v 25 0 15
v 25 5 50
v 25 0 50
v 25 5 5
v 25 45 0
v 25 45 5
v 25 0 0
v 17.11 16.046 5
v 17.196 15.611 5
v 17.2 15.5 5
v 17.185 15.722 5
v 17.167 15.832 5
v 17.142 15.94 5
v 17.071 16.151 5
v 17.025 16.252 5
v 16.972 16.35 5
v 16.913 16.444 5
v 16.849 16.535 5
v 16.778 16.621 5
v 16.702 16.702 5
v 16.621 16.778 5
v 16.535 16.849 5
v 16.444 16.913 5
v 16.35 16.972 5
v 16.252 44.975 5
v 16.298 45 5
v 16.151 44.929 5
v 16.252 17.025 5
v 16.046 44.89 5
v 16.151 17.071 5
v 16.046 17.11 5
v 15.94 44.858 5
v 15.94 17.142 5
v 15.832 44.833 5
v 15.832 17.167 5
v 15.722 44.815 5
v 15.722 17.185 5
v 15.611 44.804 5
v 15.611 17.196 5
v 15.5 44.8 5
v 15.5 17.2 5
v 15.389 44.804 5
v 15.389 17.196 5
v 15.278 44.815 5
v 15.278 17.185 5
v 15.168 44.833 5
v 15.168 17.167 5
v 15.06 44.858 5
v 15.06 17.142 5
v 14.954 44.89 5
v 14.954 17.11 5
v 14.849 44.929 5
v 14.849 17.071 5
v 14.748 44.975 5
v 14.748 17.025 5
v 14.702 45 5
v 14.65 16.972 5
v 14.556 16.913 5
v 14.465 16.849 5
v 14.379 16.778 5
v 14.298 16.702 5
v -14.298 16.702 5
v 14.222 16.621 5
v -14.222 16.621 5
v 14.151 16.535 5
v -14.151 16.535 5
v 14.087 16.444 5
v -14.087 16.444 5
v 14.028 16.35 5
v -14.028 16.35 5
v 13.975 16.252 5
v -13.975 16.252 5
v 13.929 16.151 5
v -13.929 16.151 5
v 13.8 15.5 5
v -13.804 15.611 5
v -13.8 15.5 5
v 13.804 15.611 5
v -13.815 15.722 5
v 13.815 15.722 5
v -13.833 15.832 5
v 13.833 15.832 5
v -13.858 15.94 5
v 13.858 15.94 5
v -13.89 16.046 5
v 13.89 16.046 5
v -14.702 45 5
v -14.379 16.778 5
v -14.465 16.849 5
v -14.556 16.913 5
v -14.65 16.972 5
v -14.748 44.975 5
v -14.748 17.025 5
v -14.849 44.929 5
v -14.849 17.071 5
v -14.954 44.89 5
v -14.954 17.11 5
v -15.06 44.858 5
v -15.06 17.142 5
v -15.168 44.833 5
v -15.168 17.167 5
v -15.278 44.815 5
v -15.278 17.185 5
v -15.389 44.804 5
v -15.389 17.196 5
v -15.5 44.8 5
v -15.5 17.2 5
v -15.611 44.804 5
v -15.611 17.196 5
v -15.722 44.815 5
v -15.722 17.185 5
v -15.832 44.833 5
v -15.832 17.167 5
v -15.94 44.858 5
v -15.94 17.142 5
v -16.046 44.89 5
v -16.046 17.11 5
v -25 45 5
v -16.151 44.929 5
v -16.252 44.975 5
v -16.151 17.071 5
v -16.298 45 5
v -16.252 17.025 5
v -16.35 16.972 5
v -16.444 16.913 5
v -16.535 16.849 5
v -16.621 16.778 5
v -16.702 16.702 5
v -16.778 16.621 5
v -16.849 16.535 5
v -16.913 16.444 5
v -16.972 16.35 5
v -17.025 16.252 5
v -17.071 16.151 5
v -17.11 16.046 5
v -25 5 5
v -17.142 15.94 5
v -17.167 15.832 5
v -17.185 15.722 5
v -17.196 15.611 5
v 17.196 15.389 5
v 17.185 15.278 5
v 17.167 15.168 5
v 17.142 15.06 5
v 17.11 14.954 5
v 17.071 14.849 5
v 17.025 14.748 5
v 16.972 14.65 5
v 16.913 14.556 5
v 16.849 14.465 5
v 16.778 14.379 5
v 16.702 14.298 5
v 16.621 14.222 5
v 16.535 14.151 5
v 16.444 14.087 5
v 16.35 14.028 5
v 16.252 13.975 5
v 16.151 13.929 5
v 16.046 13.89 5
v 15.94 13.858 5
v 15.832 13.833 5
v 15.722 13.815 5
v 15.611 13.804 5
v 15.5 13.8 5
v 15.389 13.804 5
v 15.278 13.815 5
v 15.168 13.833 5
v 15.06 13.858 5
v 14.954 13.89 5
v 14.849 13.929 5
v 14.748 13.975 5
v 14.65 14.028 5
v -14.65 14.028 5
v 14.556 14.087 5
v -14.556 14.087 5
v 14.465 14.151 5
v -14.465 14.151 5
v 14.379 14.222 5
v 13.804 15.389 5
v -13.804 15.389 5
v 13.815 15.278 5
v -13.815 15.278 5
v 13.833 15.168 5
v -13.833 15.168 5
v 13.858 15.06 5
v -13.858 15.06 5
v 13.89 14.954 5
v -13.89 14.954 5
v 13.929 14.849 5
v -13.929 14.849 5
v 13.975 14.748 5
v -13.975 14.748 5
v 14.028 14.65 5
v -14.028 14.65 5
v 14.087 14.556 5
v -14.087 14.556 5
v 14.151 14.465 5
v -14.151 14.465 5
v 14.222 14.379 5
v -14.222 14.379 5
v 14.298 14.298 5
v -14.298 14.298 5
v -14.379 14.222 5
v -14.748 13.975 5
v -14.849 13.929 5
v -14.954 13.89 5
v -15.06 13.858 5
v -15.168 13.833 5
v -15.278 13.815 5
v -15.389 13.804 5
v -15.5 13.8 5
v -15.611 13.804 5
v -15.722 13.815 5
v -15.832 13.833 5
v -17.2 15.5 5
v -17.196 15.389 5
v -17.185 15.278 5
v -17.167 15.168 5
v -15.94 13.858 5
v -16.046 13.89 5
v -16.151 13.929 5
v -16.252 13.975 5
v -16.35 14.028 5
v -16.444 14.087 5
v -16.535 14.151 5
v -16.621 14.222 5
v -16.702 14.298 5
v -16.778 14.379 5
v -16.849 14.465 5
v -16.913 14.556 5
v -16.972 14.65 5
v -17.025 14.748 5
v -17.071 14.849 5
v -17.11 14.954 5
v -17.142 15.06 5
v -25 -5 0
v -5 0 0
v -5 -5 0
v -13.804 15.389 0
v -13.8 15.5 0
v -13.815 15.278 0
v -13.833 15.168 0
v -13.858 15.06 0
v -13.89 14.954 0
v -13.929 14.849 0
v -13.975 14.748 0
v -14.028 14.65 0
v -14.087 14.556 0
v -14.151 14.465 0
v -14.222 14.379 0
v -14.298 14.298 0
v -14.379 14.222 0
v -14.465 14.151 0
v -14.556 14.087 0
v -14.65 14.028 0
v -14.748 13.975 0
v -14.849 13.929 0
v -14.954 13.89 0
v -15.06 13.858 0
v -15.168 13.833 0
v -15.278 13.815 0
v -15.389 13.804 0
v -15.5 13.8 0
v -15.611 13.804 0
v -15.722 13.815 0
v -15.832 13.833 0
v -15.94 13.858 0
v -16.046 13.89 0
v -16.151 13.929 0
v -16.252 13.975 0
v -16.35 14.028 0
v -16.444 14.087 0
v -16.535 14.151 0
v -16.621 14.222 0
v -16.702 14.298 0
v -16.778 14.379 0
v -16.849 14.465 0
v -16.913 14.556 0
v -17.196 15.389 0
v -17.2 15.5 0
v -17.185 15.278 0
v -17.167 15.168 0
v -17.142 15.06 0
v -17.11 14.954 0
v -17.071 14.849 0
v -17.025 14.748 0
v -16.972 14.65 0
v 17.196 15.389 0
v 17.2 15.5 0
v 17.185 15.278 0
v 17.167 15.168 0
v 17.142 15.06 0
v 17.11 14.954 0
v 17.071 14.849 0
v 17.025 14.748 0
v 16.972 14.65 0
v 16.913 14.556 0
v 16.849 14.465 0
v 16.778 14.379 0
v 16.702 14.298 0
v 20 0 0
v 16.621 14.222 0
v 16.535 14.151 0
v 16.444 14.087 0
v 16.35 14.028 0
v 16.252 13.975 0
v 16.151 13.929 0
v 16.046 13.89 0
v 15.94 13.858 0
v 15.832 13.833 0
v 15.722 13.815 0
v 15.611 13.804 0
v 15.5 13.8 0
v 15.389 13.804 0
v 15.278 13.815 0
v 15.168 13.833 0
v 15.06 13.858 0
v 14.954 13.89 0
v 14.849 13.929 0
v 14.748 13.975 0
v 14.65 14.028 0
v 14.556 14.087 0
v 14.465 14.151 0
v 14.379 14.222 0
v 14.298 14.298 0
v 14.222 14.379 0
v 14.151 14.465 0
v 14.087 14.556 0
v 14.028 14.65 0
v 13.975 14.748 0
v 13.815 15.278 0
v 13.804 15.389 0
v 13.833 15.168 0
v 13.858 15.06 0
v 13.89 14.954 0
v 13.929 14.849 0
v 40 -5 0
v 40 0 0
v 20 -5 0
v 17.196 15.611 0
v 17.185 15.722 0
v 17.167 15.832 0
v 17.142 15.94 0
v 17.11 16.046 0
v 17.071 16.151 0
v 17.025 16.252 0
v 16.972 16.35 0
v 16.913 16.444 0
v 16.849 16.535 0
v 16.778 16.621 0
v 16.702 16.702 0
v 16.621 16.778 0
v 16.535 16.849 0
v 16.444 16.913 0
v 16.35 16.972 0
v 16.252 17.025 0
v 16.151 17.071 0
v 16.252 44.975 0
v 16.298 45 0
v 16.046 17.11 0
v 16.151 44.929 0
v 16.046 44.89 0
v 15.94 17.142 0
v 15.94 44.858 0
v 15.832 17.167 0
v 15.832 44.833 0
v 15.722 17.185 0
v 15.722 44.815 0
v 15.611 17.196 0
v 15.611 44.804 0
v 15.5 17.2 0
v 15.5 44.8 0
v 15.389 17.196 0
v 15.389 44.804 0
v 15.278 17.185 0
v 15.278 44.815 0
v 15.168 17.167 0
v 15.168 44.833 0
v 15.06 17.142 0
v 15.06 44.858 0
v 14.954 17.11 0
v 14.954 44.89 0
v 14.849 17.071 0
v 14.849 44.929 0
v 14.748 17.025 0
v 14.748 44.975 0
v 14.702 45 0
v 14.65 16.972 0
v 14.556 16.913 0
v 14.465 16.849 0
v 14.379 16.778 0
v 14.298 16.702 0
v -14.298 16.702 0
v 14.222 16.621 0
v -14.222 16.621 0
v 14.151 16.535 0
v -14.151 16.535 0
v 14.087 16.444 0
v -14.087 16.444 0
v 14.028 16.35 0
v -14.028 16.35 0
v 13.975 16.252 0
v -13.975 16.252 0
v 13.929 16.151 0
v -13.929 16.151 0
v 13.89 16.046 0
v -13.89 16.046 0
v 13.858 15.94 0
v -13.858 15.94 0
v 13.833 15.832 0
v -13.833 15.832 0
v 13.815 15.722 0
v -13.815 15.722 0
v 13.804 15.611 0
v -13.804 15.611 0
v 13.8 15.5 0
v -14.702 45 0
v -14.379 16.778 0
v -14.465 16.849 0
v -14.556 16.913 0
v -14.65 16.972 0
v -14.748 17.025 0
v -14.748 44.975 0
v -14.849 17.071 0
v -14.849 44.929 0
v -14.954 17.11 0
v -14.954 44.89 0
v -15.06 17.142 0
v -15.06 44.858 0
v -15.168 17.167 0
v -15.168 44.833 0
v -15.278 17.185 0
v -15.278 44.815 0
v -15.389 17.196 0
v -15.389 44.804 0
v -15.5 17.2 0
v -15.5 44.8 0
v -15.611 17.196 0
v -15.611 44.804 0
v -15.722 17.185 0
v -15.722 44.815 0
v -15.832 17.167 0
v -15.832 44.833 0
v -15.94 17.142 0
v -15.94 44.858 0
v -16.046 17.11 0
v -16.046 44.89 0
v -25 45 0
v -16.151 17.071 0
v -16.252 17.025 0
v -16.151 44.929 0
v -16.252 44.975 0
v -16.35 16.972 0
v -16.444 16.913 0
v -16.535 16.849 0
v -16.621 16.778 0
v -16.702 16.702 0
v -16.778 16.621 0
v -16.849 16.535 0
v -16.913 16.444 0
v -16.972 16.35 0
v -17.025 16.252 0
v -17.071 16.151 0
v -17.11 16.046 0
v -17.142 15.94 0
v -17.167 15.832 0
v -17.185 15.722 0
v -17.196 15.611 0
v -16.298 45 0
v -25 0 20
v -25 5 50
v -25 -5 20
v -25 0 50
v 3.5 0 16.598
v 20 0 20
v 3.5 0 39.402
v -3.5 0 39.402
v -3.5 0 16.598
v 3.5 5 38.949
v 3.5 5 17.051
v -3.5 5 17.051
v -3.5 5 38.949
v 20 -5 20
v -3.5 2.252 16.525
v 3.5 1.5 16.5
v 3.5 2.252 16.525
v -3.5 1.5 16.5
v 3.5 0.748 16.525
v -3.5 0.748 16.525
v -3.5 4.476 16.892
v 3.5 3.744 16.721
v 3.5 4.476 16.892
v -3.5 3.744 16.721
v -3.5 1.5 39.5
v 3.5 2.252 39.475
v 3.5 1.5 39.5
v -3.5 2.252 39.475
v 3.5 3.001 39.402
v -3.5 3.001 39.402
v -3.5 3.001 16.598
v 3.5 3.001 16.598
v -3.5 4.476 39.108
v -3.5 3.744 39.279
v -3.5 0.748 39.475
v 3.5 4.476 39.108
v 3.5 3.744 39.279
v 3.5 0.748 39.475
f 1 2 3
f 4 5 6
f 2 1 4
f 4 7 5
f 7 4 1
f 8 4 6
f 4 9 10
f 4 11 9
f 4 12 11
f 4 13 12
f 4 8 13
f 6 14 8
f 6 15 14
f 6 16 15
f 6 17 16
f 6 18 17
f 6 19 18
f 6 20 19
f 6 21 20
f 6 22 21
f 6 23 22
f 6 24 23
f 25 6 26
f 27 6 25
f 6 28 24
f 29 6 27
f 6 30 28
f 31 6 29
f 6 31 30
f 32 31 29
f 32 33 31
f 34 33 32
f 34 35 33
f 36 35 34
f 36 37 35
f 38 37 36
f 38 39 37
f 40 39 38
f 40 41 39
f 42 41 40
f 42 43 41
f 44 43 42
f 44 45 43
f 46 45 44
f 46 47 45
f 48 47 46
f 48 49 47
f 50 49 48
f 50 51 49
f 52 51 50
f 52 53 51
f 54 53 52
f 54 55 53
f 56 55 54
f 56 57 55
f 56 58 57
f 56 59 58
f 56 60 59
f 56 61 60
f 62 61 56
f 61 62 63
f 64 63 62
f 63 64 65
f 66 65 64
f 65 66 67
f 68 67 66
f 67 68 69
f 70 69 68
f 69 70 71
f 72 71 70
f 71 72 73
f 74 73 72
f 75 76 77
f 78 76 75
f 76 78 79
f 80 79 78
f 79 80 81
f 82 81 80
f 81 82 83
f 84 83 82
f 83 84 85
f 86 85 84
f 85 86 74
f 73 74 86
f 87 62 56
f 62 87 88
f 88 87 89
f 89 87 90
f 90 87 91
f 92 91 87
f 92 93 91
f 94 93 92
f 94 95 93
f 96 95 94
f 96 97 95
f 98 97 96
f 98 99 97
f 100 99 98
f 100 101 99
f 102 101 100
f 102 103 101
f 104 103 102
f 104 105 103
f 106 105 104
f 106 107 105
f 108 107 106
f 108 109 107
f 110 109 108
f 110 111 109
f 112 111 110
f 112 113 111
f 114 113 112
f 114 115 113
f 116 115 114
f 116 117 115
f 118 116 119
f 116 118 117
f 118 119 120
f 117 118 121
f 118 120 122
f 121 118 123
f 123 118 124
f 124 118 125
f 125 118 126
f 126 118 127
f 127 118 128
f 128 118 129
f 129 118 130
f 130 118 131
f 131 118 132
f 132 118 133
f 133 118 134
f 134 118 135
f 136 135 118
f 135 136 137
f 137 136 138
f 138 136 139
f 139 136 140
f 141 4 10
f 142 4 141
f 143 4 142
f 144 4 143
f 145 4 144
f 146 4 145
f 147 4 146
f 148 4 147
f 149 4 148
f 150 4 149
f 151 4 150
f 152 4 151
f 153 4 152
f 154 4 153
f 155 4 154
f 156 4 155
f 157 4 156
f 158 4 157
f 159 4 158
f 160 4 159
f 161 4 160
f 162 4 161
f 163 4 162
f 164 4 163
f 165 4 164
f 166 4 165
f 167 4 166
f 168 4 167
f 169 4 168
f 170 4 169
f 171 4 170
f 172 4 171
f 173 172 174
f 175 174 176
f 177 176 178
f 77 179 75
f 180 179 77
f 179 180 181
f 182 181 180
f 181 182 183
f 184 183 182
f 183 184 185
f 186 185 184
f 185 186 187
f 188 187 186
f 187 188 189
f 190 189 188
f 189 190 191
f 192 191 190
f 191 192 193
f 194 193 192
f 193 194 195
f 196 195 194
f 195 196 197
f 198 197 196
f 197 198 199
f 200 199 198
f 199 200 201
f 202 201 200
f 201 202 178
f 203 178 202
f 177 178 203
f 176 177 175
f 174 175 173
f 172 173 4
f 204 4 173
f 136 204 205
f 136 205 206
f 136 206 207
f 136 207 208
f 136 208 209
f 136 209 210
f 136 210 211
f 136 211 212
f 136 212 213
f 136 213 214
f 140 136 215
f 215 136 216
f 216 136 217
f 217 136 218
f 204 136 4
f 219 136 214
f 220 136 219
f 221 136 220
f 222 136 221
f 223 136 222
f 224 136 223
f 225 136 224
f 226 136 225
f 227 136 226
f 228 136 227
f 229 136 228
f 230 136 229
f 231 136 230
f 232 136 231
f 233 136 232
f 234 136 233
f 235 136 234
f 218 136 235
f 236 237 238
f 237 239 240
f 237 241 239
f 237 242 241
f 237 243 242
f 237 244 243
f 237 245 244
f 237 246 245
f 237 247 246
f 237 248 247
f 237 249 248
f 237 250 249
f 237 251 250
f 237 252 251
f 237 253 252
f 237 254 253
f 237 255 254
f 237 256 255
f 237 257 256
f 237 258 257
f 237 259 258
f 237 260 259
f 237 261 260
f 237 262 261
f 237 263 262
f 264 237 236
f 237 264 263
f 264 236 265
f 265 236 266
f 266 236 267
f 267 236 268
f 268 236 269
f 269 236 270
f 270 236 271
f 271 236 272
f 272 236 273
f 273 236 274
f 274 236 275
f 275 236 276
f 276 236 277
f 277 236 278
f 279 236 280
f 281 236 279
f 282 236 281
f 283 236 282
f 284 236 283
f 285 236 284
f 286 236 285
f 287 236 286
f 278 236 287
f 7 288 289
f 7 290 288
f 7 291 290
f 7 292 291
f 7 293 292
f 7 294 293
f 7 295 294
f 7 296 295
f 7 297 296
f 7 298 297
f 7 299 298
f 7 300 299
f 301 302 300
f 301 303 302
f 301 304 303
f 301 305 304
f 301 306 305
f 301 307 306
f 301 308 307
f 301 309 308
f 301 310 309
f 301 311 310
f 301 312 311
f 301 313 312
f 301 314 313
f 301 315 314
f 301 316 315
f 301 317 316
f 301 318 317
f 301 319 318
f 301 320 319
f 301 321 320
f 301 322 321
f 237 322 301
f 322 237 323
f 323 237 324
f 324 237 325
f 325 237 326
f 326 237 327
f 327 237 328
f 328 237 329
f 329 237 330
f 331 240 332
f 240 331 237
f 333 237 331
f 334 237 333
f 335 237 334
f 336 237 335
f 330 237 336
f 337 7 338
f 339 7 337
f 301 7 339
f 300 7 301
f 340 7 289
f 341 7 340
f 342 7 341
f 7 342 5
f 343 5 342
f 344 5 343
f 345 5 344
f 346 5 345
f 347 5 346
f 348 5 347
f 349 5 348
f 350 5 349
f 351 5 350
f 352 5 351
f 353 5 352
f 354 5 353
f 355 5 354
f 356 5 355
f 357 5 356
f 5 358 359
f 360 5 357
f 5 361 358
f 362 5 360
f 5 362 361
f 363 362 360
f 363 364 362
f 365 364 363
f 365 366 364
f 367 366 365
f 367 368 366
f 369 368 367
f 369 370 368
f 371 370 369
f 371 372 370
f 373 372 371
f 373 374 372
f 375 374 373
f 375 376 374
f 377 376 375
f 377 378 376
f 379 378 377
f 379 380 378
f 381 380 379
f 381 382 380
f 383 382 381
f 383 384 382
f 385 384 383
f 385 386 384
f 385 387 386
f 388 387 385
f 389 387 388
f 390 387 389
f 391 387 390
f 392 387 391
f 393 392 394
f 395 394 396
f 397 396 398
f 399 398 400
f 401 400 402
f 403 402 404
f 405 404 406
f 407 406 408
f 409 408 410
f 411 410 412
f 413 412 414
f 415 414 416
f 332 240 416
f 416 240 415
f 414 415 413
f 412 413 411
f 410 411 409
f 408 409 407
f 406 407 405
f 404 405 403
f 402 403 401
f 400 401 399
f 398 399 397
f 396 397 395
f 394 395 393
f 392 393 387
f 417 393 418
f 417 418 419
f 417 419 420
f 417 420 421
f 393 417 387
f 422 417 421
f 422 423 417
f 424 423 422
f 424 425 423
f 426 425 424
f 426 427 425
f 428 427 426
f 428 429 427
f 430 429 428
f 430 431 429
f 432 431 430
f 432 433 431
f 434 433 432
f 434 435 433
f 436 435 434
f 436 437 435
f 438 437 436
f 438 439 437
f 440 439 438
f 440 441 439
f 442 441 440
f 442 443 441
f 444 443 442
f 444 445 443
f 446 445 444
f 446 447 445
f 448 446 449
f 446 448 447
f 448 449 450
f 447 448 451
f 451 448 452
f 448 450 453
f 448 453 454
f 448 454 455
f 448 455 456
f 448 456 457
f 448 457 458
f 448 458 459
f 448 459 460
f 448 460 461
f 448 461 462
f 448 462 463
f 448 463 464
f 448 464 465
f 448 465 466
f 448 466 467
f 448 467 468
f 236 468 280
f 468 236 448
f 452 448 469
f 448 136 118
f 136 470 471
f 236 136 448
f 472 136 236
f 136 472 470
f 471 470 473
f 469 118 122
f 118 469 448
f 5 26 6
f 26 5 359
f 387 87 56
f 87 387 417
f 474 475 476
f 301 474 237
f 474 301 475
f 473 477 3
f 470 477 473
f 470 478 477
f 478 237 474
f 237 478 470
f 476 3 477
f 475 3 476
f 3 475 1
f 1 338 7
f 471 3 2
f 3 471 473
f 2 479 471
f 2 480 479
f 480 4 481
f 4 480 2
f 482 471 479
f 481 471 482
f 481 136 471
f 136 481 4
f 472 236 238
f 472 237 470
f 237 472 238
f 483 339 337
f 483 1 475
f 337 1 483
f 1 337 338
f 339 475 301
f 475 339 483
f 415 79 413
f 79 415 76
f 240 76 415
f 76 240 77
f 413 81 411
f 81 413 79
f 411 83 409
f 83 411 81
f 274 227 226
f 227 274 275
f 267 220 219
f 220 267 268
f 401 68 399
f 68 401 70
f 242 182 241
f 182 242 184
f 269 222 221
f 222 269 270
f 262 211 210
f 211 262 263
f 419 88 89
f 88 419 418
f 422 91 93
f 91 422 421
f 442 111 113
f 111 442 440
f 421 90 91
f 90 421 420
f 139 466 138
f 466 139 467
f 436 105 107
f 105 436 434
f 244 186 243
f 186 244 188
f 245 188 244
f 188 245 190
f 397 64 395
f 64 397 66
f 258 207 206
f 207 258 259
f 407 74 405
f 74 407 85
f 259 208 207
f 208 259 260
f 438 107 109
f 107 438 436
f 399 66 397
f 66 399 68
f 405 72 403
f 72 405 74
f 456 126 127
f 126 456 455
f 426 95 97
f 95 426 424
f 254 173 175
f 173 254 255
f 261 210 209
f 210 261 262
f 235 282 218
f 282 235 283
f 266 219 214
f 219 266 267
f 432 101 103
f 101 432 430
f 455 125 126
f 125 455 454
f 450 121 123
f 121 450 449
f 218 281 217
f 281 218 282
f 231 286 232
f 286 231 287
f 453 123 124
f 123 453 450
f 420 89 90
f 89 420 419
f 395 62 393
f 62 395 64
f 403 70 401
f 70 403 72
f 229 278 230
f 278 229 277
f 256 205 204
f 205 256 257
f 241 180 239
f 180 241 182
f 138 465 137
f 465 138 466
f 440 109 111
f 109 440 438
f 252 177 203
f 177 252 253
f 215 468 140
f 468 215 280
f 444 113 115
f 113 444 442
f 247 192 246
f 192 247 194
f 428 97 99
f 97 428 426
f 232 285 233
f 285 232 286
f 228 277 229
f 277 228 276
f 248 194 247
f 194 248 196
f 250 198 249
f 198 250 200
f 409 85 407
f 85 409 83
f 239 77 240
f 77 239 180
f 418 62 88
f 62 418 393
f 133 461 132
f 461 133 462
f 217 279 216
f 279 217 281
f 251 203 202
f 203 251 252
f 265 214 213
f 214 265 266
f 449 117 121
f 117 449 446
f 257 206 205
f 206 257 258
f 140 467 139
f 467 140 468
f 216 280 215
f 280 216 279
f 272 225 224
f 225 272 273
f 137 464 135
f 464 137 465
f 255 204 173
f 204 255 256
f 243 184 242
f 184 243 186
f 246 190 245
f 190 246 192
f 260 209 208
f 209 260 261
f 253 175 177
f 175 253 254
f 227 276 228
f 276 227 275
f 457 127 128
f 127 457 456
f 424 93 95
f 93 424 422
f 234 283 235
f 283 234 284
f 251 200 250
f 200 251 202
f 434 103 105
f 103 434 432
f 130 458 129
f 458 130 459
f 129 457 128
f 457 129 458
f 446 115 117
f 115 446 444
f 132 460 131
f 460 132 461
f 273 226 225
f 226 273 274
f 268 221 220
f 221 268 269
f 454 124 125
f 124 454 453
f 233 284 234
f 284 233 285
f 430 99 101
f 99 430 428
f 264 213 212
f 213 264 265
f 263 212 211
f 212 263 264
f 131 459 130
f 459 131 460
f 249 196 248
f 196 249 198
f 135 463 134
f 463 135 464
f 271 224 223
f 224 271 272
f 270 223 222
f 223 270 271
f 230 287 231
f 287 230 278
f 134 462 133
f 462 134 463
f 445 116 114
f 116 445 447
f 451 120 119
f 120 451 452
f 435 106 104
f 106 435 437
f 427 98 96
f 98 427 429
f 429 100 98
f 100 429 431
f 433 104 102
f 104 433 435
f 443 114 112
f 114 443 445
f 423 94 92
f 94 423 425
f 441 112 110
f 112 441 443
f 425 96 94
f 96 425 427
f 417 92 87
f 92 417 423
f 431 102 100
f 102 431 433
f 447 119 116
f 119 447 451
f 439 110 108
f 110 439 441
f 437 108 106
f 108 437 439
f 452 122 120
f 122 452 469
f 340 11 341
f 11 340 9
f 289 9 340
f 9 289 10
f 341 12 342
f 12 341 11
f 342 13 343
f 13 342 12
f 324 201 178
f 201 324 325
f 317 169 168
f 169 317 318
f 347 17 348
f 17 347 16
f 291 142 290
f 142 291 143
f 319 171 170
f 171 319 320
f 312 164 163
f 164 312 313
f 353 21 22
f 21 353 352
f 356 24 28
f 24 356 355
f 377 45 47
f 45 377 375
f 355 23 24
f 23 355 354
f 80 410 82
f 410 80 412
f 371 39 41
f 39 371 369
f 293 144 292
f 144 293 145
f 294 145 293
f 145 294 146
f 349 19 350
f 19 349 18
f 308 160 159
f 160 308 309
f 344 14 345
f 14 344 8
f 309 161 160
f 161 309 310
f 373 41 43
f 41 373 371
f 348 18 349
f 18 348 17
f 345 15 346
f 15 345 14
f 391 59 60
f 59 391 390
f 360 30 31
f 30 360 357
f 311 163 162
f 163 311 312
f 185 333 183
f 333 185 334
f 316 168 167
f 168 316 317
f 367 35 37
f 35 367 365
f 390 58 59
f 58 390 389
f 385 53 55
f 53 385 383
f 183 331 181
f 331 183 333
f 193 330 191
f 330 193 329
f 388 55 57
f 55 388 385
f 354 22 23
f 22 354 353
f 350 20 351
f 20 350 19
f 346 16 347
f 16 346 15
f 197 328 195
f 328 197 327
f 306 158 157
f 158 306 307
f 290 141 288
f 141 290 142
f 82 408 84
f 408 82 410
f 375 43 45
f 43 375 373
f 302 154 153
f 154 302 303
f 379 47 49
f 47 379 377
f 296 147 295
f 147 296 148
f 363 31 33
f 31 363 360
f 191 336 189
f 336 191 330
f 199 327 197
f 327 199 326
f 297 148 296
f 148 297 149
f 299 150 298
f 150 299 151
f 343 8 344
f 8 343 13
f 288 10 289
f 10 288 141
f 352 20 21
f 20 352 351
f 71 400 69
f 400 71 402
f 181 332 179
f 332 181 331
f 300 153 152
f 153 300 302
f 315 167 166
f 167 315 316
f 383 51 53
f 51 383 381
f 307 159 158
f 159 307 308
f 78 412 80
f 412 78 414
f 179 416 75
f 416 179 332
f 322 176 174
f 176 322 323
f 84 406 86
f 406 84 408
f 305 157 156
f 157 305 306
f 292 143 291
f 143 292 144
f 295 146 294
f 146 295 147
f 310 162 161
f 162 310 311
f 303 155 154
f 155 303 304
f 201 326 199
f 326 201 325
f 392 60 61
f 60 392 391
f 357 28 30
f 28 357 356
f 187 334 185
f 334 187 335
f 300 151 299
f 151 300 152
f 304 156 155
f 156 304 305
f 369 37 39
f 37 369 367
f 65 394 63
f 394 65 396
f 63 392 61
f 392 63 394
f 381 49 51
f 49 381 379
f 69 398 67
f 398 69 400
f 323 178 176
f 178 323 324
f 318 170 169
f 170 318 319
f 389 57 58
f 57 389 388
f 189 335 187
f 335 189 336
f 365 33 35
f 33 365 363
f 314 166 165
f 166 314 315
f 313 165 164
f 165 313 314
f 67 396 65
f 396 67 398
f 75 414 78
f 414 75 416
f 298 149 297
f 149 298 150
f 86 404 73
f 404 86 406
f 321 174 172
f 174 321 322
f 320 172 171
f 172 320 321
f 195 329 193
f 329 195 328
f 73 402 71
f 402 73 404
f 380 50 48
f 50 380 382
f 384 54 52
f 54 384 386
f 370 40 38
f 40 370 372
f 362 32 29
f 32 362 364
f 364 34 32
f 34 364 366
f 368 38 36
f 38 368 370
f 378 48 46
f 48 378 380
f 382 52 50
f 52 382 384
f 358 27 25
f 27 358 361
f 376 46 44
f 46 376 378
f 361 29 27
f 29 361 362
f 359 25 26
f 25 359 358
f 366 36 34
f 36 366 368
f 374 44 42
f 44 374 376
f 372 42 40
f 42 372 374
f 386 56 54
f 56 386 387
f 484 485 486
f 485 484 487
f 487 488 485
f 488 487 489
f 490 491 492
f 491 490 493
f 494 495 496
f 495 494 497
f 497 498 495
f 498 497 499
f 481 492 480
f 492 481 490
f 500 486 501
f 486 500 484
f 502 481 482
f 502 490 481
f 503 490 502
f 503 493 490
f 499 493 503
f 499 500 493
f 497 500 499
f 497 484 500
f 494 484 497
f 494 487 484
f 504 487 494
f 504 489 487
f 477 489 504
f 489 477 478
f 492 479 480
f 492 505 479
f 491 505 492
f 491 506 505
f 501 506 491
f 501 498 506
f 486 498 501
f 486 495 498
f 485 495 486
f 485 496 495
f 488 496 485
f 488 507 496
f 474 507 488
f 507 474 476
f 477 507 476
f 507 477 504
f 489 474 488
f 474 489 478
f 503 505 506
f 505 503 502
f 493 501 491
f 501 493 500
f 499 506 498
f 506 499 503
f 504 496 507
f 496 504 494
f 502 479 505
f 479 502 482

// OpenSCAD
// L-shaped mounting bracket for NEMA 17 stepper motor
// Print orientation: base plate on bed (z = 0), motor plate builds upward (+Z)

$fn = 96;

// ---- Base plate ----
base_x0 = -25;      // base plate X start
base_x1 = 25;       // base plate X end
base_y0 = 0;        // base plate Y start
base_y1 = 45;       // base plate Y end
base_z1 = 5;        // base plate thickness (Z)

// ---- Motor plate ----
motor_x0 = -25;     // motor plate X start
motor_x1 = 25;      // motor plate X end
motor_y0 = 0;       // motor plate Y start
motor_y1 = 5;       // motor plate thickness (Y)
motor_z0 = 0;       // motor plate Z start
motor_z1 = 50;      // motor plate top (Z)

// ---- Boss hole (motor centring) ----
boss_d     = 23;    // boss hole diameter
boss_x     = 0;     // boss hole centre X
boss_z     = 28;    // boss hole centre Z
boss_h     = motor_y1 + 2; // hole length along Y (through plate with clearance)

// ---- Screw holes ----
screw_d    = 3.4;   // M3 screw hole diameter
screw_pat  = 31;    // square pattern side length
screw_n    = 4;     // number of screw holes

// ---- Gussets ----
gusset_t   = 5;     // gusset thickness (X)
gusset_leg = 20;    // right triangle leg length (Y and Z)
gusset_x0  = -25;   // left gusset X start
gusset_x1  = 20;    // right gusset X end
// gusset right-angle corner at y = 5, z = 5 (where plates meet)

eps        = 0.5;   // cutter overshoot past faces

difference() {
    union() {
        // Base plate
        translate([base_x0, base_y0, 0])
            cube([base_x1 - base_x0, base_y1 - base_y0, base_z1]);

        // Motor plate
        translate([motor_x0, motor_y0, motor_z0])
            cube([motor_x1 - motor_x0, motor_y1 - motor_y0, motor_z1 - motor_z0]);

        // Left gusset
        translate([gusset_x0, 0, 0])
            rotate([90, 0, 0])
                linear_extrude(height = gusset_t)
                    polygon([[0, 0], [gusset_leg, 0], [0, gusset_leg]]);

        // Right gusset
        translate([gusset_x1, 0, 0])
            rotate([90, 0, 0])
                linear_extrude(height = gusset_t)
                    polygon([[0, 0], [gusset_leg, 0], [0, gusset_leg]]);
    }

    // Boss hole along Y
    translate([boss_x, motor_y1 - boss_h / 2, boss_z])
        rotate([0, 90, 0])
            cylinder(d = boss_d, h = boss_h, center = true);

    // Screw holes on square pattern, centred on boss hole
    for (i = [0 : screw_n - 1]) {
        for (j = [0 : screw_n - 1]) {
            x = (i - (screw_n - 1) / 2) * screw_pat;
            y = (j - (screw_n - 1) / 2) * screw_pat;
            translate([x, y, -eps])
                cylinder(d = screw_d, h = base_z1 + motor_z1 + 2 * eps);
        }
    }
}
